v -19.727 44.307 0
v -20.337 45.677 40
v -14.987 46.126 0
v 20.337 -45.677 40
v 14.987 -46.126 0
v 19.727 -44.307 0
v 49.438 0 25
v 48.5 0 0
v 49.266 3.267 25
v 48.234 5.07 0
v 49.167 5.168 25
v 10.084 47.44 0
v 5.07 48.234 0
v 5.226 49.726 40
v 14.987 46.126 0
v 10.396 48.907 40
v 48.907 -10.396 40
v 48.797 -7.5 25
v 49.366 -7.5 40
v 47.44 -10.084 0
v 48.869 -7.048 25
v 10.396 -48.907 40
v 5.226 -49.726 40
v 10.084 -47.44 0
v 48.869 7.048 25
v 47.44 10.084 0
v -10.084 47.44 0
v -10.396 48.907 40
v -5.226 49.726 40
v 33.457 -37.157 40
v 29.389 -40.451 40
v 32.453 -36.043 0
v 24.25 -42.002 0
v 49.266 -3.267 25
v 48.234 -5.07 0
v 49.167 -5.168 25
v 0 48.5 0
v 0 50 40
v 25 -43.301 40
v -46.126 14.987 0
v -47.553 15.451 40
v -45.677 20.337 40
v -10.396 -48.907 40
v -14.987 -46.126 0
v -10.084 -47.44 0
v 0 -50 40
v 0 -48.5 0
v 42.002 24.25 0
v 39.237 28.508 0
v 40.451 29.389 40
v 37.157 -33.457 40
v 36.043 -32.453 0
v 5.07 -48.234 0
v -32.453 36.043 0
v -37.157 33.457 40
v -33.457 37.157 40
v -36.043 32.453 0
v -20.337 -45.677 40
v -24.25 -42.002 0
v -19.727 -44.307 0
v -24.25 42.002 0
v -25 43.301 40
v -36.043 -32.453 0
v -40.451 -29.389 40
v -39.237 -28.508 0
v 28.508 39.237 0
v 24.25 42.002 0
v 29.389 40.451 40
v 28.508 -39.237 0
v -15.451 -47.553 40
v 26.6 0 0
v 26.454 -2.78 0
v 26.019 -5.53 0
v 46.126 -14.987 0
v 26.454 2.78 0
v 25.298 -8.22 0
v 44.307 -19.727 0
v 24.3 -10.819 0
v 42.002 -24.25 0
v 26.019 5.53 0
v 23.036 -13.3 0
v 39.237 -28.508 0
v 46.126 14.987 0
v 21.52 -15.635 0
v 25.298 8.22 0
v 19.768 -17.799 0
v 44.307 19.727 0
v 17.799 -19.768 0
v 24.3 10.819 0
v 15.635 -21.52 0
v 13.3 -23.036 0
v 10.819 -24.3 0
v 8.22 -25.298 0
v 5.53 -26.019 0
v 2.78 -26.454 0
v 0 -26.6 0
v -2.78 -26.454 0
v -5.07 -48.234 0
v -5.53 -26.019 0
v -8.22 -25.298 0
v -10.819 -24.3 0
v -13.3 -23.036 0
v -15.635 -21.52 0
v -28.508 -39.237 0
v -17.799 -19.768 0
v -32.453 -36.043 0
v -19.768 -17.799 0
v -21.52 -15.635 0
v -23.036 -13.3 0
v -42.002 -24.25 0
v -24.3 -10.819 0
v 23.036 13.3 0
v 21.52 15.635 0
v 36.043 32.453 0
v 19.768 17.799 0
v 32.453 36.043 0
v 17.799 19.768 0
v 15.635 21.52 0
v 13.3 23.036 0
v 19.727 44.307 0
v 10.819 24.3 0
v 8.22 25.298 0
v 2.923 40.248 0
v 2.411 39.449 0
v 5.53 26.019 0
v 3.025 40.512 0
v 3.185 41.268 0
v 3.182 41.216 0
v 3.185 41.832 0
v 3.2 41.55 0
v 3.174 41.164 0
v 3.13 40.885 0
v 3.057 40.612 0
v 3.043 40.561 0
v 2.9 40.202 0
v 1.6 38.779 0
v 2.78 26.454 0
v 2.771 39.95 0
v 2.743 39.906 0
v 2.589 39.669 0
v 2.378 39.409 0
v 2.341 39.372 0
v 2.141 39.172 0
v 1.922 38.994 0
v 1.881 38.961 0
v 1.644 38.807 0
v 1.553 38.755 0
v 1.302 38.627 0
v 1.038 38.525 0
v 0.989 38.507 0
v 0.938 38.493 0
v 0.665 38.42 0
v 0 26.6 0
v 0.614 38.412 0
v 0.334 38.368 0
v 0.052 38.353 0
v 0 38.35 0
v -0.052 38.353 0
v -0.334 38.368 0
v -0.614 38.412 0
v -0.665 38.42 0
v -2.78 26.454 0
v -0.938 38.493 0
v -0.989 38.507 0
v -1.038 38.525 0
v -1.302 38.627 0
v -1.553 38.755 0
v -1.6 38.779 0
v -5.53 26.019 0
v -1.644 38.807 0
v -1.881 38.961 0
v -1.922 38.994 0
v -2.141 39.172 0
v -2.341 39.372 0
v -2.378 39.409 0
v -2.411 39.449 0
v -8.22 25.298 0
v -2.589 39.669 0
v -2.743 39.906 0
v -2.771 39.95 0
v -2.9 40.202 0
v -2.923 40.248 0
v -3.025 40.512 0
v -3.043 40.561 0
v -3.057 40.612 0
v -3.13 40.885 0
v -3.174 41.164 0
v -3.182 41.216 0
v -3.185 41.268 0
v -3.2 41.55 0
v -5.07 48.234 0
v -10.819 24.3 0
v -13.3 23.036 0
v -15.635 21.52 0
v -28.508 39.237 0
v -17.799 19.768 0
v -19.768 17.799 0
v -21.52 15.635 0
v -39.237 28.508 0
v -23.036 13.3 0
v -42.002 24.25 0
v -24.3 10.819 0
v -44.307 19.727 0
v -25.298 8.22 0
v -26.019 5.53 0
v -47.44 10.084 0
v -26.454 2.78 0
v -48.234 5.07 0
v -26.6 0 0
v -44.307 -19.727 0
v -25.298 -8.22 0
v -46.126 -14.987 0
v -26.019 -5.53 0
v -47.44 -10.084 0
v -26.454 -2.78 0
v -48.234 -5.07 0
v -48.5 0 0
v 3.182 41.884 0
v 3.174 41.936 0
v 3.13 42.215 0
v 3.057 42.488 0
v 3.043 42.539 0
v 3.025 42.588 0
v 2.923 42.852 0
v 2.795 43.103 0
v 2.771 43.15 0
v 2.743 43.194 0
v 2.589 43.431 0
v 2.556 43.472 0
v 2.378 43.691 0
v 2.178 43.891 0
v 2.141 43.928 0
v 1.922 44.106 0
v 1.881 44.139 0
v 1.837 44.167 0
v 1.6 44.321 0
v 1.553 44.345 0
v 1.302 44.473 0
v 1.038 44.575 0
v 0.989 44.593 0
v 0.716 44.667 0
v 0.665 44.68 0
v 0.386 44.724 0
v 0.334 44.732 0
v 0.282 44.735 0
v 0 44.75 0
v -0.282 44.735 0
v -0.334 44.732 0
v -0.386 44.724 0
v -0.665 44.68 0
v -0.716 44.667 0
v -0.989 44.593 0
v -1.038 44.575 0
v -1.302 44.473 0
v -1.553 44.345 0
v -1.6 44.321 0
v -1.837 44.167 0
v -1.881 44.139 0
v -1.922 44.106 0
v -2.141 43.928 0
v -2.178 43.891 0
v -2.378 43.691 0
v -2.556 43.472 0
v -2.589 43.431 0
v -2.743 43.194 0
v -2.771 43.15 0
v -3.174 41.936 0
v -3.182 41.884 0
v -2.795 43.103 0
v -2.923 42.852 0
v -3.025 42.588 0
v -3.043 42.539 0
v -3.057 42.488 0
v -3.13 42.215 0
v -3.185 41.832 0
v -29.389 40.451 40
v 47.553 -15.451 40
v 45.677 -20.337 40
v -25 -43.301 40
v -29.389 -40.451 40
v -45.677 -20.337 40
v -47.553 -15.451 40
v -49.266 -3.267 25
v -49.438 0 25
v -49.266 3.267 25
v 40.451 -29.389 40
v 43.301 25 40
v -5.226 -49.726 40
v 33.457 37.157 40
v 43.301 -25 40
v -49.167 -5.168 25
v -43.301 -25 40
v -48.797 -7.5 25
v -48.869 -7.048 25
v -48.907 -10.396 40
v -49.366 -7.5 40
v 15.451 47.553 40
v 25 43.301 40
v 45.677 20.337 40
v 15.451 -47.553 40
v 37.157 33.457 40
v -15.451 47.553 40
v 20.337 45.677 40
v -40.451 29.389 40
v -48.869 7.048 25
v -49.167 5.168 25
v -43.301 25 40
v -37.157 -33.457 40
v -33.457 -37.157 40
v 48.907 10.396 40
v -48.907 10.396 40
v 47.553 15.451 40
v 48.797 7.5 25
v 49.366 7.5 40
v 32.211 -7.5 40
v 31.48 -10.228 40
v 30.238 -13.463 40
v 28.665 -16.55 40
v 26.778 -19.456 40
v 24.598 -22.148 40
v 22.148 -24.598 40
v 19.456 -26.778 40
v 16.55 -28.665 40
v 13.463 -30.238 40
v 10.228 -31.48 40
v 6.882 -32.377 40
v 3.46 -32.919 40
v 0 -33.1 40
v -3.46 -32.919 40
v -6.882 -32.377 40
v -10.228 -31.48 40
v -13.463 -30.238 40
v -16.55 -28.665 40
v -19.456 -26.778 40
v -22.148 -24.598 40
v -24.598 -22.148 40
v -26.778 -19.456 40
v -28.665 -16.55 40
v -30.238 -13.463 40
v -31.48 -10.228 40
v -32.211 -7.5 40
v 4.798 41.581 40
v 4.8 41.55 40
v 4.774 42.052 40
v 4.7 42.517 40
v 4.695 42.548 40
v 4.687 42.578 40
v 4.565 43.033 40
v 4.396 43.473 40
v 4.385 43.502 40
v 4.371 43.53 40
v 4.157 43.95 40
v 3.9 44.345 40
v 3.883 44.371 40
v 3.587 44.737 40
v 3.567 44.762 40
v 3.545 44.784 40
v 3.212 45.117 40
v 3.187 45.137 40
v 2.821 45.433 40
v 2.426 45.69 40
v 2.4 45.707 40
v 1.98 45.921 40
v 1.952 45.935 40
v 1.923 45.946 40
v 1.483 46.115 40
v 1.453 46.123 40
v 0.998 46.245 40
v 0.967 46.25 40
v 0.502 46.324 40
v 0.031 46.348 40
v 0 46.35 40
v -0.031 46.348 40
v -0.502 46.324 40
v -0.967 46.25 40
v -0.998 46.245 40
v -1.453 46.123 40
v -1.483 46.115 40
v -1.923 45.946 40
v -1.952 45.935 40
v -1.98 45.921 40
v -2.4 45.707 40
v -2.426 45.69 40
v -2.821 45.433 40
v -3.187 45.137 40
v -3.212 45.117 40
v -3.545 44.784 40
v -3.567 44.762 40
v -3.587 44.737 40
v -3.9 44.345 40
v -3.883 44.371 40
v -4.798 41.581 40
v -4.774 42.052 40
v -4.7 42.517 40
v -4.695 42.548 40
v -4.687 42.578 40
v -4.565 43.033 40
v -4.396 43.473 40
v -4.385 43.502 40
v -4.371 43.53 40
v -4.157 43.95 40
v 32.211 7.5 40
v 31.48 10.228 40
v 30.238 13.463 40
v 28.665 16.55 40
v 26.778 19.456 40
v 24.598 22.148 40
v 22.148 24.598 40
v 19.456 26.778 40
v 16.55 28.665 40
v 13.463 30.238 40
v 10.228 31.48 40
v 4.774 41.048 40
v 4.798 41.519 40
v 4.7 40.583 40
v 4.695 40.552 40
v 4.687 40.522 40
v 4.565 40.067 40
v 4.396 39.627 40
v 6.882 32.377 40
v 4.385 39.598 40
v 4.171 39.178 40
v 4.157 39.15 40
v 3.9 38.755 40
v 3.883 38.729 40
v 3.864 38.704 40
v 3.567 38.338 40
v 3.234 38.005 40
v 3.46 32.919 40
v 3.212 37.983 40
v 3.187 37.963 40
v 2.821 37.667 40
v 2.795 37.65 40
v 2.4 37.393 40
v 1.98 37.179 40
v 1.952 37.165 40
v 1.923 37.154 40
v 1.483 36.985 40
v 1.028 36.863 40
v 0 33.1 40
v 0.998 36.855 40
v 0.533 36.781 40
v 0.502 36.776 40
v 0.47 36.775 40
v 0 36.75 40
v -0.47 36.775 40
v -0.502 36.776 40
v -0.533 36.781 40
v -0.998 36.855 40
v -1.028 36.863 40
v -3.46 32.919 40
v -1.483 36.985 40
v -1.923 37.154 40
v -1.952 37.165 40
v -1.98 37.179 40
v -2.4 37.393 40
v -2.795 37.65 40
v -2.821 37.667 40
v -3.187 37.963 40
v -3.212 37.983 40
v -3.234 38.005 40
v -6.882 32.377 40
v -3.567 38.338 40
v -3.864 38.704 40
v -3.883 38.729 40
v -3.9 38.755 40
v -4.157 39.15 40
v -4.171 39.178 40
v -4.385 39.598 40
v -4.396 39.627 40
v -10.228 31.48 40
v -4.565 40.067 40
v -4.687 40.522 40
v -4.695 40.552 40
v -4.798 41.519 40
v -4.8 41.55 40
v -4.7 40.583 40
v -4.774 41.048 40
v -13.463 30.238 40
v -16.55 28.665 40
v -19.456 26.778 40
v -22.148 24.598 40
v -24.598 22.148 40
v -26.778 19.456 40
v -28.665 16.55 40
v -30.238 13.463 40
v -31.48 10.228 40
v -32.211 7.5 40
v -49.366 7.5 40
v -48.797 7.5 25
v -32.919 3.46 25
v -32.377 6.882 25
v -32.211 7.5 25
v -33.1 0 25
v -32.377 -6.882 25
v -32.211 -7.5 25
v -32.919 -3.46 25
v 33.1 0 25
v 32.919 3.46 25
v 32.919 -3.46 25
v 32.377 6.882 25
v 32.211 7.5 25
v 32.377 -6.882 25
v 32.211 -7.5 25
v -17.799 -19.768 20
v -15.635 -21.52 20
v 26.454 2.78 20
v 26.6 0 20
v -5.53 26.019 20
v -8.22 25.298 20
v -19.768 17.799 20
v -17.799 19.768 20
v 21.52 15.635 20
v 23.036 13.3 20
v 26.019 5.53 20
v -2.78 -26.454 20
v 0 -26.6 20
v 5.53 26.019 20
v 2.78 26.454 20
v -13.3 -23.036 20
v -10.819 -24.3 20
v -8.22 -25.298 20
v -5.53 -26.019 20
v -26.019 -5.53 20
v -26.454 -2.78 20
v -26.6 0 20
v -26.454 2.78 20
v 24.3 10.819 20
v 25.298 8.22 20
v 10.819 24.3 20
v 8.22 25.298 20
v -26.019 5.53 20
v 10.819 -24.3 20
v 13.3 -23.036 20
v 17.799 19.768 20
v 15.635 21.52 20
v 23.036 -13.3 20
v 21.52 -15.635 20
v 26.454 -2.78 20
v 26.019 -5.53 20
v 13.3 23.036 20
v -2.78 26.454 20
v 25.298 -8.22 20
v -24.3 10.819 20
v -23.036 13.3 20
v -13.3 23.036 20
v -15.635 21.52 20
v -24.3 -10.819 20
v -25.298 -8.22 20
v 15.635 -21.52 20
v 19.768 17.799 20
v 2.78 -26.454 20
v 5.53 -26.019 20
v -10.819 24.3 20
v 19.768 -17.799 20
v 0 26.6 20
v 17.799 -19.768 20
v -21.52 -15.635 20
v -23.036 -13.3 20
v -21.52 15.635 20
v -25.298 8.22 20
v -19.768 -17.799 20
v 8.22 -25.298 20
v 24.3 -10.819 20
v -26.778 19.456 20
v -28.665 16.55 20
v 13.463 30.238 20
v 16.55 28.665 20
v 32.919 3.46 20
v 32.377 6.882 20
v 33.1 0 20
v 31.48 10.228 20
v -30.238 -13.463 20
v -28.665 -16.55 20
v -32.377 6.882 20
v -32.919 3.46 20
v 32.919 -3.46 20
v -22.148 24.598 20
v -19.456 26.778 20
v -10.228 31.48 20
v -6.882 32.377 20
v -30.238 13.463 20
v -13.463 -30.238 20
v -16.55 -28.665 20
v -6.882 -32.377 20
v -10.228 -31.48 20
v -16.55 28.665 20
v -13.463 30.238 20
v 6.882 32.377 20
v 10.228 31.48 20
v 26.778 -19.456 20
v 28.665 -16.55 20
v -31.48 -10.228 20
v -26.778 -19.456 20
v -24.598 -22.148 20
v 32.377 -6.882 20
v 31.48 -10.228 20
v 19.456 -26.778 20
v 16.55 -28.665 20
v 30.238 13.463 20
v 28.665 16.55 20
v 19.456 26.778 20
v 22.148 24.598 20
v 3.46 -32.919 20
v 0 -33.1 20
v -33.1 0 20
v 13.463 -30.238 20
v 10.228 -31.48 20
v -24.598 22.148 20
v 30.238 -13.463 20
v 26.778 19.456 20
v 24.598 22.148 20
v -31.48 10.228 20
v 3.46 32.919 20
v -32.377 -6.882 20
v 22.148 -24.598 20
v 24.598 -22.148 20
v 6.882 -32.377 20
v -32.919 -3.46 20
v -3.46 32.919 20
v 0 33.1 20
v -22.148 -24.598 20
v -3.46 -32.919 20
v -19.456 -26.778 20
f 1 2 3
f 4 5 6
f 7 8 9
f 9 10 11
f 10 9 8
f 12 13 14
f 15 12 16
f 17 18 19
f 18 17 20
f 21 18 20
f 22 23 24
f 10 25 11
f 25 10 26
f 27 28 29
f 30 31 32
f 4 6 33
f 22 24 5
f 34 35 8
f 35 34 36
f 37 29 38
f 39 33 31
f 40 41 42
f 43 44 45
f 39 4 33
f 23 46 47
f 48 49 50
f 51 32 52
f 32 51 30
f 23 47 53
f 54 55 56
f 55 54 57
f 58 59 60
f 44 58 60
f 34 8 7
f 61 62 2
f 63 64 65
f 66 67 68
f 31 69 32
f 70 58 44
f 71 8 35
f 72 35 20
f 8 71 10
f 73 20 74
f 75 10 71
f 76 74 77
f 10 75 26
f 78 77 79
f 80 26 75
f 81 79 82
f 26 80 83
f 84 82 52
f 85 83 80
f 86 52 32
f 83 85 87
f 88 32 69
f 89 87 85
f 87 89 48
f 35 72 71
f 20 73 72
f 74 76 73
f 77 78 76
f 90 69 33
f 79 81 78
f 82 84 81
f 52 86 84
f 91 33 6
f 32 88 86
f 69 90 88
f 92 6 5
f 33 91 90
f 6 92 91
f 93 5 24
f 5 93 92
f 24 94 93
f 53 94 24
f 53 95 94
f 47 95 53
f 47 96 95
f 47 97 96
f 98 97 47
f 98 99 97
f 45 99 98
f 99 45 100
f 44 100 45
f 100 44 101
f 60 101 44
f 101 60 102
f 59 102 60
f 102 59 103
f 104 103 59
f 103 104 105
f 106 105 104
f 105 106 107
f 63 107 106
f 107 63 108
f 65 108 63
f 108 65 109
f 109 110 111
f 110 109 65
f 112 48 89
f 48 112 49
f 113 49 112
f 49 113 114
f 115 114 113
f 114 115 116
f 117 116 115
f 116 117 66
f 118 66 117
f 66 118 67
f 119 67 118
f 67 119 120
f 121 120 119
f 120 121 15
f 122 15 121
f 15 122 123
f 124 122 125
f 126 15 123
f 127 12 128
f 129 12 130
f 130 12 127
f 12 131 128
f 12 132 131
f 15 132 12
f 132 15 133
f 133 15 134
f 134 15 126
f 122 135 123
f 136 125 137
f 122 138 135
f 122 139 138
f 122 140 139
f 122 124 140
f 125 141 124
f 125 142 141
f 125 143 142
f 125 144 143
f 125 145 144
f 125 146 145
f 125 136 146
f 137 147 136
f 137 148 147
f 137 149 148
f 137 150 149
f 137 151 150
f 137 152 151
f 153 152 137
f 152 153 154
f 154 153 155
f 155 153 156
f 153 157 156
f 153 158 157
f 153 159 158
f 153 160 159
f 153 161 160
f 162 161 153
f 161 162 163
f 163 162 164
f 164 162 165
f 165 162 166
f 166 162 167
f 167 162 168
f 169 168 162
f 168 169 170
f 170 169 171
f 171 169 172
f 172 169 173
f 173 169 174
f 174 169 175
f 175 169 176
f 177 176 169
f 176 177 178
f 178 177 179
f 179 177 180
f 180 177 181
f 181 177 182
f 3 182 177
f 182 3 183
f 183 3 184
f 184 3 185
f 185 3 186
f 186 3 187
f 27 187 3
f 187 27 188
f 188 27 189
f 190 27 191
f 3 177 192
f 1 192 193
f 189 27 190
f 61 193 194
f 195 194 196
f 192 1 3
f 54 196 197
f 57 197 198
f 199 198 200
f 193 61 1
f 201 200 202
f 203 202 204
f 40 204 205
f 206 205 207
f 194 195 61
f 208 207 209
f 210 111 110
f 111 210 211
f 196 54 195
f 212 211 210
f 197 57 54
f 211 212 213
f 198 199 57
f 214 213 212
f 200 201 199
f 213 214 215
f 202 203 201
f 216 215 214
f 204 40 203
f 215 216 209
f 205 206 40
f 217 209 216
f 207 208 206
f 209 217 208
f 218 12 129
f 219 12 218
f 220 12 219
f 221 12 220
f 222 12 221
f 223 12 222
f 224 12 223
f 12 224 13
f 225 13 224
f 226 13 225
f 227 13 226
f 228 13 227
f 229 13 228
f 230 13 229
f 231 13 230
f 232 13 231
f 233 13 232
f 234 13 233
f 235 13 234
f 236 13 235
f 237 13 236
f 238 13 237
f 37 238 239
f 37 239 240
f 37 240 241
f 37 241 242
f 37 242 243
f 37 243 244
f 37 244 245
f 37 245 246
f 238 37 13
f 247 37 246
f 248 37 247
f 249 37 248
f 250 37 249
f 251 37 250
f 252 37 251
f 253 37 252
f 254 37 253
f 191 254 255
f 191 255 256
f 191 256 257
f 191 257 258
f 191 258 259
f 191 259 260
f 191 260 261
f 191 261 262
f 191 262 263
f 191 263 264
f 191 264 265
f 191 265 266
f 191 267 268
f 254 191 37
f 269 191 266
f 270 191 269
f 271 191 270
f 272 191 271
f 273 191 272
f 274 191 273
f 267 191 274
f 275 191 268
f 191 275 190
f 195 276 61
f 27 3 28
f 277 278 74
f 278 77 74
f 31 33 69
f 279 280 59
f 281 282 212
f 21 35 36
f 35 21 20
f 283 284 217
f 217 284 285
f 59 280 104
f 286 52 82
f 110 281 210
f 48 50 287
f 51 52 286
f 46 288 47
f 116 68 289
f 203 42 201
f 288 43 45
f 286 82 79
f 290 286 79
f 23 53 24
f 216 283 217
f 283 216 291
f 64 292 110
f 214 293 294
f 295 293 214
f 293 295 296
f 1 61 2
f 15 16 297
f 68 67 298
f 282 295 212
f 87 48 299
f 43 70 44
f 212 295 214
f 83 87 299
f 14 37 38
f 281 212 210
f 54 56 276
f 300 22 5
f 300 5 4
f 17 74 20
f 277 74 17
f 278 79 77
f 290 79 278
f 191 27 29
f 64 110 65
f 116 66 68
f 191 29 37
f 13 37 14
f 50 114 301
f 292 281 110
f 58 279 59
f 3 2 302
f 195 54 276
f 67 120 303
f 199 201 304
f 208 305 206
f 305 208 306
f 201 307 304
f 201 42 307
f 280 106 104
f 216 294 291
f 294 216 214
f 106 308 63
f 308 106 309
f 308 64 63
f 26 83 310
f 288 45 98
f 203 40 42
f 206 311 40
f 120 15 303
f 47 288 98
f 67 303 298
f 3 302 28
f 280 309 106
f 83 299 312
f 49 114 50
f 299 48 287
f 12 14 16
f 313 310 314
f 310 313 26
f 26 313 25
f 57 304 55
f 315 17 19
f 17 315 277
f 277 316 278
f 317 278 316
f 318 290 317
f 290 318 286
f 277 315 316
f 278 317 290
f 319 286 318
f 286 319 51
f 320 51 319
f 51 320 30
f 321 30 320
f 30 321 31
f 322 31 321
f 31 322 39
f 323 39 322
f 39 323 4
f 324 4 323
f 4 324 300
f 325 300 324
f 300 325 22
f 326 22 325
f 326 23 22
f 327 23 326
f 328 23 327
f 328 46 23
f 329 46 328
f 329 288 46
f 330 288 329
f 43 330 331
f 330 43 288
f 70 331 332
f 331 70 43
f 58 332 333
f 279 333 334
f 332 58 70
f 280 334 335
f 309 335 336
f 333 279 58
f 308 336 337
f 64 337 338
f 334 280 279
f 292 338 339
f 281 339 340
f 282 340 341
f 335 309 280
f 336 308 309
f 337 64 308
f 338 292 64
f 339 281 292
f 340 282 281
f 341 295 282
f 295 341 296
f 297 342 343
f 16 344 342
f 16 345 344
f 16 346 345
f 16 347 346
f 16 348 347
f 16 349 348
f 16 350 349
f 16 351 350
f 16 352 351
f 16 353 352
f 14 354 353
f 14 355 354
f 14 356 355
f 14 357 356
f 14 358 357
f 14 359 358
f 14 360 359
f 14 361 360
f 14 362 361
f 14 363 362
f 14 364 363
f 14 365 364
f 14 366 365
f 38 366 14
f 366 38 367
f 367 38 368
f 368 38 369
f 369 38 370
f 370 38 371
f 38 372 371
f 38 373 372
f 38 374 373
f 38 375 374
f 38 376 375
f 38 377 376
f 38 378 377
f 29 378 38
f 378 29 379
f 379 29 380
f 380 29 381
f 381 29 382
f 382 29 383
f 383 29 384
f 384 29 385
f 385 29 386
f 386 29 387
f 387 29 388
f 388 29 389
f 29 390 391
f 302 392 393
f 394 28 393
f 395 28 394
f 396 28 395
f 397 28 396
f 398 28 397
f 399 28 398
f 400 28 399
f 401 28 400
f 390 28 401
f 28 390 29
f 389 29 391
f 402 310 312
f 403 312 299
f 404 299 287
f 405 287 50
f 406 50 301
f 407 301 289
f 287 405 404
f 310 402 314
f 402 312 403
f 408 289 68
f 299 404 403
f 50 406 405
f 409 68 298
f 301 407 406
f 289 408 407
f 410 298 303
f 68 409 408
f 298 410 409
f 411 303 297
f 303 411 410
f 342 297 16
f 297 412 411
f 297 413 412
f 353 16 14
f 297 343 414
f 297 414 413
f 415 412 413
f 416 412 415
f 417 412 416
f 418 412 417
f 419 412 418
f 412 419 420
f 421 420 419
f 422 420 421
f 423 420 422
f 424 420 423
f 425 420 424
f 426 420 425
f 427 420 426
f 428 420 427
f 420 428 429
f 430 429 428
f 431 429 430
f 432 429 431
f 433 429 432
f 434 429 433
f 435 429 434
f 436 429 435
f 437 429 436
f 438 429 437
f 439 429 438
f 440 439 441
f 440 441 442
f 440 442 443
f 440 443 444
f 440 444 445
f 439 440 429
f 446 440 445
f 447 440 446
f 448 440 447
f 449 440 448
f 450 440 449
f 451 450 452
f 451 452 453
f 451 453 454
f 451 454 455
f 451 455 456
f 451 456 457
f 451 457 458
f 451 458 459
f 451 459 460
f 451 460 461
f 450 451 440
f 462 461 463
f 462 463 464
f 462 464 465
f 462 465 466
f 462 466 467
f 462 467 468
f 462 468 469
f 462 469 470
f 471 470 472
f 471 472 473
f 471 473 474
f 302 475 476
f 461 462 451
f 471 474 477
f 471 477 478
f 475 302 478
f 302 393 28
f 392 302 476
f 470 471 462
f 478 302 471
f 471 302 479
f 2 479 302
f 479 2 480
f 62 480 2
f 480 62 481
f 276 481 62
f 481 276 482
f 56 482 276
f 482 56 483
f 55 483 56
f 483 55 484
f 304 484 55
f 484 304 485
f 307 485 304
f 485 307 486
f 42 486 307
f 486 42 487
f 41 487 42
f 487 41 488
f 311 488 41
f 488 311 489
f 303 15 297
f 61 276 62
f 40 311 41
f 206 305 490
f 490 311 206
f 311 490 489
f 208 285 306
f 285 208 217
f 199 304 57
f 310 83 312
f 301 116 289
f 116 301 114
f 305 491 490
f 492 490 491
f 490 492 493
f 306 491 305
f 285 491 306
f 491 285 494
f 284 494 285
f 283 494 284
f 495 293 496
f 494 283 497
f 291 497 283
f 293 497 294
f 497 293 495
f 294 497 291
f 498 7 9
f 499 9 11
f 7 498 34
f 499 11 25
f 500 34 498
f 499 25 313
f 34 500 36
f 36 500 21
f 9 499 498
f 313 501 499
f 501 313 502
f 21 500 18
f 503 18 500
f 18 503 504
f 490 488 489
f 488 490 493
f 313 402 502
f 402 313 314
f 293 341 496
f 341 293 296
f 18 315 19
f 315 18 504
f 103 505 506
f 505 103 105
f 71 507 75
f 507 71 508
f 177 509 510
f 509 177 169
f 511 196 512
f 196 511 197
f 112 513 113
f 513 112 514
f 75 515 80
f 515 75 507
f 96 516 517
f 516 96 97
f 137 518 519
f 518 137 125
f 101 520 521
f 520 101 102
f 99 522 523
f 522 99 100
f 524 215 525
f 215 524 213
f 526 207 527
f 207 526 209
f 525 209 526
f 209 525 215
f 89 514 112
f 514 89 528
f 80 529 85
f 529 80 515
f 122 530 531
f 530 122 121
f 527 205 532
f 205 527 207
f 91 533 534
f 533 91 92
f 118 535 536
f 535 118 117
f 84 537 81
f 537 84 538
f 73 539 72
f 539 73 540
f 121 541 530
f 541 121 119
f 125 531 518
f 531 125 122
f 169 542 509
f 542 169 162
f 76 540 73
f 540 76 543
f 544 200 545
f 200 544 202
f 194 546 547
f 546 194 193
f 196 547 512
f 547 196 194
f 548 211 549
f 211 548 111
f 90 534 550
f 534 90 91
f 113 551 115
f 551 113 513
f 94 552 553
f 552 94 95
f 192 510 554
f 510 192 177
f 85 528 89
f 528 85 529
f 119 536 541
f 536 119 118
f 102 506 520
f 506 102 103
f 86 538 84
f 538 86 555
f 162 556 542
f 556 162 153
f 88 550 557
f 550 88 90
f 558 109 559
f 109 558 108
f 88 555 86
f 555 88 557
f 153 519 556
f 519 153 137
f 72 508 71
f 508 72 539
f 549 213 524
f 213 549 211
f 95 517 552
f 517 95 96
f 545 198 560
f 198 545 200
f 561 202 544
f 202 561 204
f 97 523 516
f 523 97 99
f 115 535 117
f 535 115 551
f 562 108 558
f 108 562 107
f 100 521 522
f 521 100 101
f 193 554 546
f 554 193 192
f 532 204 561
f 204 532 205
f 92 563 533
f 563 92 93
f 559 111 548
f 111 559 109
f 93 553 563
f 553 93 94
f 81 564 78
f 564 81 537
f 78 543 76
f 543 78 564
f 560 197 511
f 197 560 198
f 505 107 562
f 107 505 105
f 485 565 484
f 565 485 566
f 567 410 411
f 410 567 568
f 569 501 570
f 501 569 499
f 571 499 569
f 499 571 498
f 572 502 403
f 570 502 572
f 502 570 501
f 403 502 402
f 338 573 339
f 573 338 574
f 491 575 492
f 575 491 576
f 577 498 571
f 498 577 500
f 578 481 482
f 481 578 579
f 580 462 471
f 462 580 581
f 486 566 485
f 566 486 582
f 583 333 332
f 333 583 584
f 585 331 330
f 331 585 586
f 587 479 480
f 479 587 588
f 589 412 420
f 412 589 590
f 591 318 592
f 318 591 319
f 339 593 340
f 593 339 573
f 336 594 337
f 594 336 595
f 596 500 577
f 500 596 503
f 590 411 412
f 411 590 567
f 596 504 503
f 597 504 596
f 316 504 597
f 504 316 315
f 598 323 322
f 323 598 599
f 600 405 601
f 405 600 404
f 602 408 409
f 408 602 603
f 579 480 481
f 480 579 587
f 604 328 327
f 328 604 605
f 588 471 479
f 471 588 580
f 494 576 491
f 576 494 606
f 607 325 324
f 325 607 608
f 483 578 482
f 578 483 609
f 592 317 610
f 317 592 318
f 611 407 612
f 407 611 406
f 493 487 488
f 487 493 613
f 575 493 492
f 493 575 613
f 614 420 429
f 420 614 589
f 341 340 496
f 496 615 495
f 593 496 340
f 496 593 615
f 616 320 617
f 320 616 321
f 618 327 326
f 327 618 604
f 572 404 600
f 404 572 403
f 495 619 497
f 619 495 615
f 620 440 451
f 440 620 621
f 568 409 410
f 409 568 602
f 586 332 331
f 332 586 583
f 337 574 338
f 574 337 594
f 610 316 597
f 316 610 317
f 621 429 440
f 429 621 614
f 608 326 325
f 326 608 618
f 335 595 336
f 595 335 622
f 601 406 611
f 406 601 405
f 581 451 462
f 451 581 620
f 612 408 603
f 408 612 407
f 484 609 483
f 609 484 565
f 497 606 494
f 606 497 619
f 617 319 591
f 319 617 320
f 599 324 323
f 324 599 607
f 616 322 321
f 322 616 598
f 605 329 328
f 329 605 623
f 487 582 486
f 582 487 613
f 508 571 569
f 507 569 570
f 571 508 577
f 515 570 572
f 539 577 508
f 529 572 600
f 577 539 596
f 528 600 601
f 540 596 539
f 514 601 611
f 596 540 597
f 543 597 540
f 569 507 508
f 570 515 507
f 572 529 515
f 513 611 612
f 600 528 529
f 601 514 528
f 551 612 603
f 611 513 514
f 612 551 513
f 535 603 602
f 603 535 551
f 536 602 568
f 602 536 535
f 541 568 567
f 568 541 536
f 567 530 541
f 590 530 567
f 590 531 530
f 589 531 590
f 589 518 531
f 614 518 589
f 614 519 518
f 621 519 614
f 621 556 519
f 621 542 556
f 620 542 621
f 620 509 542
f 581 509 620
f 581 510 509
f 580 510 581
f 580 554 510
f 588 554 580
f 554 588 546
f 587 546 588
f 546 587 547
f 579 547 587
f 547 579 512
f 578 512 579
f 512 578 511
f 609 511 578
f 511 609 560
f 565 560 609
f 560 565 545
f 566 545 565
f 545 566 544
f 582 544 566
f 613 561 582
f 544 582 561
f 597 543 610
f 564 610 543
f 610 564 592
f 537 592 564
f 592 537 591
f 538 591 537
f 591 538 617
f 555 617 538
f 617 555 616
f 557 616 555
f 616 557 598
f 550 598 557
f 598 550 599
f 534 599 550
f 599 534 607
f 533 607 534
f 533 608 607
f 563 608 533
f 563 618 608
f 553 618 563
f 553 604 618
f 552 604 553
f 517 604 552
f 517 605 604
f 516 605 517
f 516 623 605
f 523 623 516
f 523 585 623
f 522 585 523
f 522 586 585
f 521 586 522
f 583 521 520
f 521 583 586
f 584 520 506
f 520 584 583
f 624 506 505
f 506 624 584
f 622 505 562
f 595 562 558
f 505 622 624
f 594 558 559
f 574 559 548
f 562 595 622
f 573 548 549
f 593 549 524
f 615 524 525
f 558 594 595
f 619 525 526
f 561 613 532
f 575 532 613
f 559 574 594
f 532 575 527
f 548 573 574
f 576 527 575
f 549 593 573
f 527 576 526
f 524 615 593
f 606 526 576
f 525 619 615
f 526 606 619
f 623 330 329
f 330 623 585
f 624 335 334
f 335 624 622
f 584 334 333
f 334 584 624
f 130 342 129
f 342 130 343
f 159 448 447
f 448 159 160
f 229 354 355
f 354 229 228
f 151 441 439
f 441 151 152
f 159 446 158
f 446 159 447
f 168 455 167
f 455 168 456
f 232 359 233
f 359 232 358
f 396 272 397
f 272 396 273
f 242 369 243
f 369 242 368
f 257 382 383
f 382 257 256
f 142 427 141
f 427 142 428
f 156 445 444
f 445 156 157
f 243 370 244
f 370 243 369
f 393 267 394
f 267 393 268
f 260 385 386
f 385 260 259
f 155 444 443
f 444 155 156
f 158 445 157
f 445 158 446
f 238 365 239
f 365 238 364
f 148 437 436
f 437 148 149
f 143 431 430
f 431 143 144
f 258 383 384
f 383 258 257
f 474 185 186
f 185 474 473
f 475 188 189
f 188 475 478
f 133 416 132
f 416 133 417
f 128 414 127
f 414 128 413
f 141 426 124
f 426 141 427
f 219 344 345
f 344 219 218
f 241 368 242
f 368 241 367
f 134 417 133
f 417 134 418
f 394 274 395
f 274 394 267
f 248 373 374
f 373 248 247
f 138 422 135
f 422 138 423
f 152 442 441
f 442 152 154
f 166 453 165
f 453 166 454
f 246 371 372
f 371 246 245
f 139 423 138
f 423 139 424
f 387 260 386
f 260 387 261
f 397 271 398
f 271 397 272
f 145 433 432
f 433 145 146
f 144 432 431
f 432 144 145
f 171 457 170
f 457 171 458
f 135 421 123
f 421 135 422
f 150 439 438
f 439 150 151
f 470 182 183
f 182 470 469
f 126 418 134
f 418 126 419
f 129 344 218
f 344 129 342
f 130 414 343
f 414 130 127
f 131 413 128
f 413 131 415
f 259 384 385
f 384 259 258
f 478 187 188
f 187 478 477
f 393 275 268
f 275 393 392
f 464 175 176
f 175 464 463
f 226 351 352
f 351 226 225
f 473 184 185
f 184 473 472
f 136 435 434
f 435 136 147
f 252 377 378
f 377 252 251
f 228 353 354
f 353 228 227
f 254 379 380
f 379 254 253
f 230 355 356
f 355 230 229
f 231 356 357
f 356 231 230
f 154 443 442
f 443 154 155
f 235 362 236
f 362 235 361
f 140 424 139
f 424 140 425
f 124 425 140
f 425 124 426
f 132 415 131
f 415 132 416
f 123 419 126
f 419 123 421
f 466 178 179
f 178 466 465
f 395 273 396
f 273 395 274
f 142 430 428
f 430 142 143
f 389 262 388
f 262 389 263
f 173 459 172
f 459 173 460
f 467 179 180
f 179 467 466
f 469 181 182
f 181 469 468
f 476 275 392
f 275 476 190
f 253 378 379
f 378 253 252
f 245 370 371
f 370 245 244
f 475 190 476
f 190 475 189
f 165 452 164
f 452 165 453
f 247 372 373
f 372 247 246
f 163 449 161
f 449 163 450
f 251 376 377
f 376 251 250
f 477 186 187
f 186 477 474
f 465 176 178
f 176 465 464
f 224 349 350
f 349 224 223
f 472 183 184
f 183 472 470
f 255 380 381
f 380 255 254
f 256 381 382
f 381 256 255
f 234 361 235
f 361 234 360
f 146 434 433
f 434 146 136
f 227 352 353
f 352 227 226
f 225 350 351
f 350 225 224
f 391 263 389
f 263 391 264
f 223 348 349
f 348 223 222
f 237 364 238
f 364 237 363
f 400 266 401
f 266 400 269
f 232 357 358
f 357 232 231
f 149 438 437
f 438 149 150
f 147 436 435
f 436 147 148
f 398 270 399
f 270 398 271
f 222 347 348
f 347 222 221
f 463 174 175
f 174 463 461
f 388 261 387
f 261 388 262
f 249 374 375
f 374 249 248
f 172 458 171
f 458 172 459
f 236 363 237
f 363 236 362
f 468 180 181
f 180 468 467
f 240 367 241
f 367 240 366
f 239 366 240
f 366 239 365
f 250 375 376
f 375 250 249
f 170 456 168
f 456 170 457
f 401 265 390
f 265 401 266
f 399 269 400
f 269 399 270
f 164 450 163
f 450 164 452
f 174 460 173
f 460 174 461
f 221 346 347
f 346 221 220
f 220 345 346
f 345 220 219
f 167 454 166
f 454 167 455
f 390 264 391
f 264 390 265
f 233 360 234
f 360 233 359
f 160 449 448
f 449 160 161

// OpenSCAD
//*******************************************************************************
// Parametric Cupholder Adaptor
//------------------------------
// Written by Mark C. 2017
// Built using OpenSCAD 2015.03-2
// V1 : Initial Prototype
// V2 : Cleaned up Code and Variables + Added Taper Variable for Tapered Cupholders
// V3 : Added Pen Hole Option and fixed up solids rendering
//*******************************************************************************
//-------------------------------------------------------------------------------
//                             Description
//-------------------------------------------------------------------------------
//Type...: Utility Part
//Notes..: Use this to generate a car cupholder adaptor to fit larger holes. Has holes to suit
//redbull 250ml cans and standard cans and also a mobile phone holder slot
//-------------------------------------------------------------------------------
//                             PARAMETERS
//-------------------------------------------------------------------------------

Cupholder_Overall_Dia = 100; // Overall adaptor diameter to suit car oversized cupholder
Cupholder_Hieght = 40; // Thickness of the Adaptor min is probably 20mm
Taper_Difference = 3; // Measurement in mm to reduce from the Overall Dia size as a taper for the adaptor if your cupholders taper down at the bottom
Fitting_Tolerance = 0.2; // Fitting tolerance to allow for snug but not tight fit

Cupholder_Hole_innerdim1 = 66 + Fitting_Tolerance; // 66mm = Standard Coke cans
Cupholder_Hole_innerdim2 = 53 + Fitting_Tolerance; // 53mm = Redbull cans

Phone_Slot_Width = 15; // Make sure to allow for cases and if you want a slight tilt on it.
Phone_Slot_Hieght = 15; // Phone Slot Hieght

Pen_Hole_Dia = 6 ; // Pen Hole that fits common pencils - 0 to disable

Smoothing_Factor = 60; // Mesh Smoothing Factor

$fn = Smoothing_Factor; // Setting Smoothing Factor

//-------------------------------------------------------------------------------
//                             MAIN CODE
//-------------------------------------------------------------------------------

difference(){
cylinder(Cupholder_Hieght , d1=Cupholder_Overall_Dia-Taper_Difference ,d2=Cupholder_Overall_Dia ); // Overall Part
translate([-Cupholder_Overall_Dia/2,-Phone_Slot_Width/2,Cupholder_Hieght-Phone_Slot_Hieght])
    cube([Cupholder_Overall_Dia, Phone_Slot_Width, Phone_Slot_Hieght+10]); // Phone Slot
cylinder(Cupholder_Hieght+10 , d=Cupholder_Hole_innerdim2 , d=Cupholder_Hole_innerdim2 , center=true ); // Smallest Inside Hole
translate([0,0,Cupholder_Hieght/2])
    cylinder(Cupholder_Hieght/2+10 , d=Cupholder_Hole_innerdim1 , d=Cupholder_Hole_innerdim1 ); // 2nd Smallest Inside Hole

if (Pen_Hole_Dia>0) // Check for Pen hole Option
translate([0,(Cupholder_Overall_Dia+Cupholder_Hole_innerdim1)/4,-5])
    cylinder(Cupholder_Hieght+10 , d1=Pen_Hole_Dia , d2=Pen_Hole_Dia+4 ); // Pen Hole with Taper
   else ;
};
